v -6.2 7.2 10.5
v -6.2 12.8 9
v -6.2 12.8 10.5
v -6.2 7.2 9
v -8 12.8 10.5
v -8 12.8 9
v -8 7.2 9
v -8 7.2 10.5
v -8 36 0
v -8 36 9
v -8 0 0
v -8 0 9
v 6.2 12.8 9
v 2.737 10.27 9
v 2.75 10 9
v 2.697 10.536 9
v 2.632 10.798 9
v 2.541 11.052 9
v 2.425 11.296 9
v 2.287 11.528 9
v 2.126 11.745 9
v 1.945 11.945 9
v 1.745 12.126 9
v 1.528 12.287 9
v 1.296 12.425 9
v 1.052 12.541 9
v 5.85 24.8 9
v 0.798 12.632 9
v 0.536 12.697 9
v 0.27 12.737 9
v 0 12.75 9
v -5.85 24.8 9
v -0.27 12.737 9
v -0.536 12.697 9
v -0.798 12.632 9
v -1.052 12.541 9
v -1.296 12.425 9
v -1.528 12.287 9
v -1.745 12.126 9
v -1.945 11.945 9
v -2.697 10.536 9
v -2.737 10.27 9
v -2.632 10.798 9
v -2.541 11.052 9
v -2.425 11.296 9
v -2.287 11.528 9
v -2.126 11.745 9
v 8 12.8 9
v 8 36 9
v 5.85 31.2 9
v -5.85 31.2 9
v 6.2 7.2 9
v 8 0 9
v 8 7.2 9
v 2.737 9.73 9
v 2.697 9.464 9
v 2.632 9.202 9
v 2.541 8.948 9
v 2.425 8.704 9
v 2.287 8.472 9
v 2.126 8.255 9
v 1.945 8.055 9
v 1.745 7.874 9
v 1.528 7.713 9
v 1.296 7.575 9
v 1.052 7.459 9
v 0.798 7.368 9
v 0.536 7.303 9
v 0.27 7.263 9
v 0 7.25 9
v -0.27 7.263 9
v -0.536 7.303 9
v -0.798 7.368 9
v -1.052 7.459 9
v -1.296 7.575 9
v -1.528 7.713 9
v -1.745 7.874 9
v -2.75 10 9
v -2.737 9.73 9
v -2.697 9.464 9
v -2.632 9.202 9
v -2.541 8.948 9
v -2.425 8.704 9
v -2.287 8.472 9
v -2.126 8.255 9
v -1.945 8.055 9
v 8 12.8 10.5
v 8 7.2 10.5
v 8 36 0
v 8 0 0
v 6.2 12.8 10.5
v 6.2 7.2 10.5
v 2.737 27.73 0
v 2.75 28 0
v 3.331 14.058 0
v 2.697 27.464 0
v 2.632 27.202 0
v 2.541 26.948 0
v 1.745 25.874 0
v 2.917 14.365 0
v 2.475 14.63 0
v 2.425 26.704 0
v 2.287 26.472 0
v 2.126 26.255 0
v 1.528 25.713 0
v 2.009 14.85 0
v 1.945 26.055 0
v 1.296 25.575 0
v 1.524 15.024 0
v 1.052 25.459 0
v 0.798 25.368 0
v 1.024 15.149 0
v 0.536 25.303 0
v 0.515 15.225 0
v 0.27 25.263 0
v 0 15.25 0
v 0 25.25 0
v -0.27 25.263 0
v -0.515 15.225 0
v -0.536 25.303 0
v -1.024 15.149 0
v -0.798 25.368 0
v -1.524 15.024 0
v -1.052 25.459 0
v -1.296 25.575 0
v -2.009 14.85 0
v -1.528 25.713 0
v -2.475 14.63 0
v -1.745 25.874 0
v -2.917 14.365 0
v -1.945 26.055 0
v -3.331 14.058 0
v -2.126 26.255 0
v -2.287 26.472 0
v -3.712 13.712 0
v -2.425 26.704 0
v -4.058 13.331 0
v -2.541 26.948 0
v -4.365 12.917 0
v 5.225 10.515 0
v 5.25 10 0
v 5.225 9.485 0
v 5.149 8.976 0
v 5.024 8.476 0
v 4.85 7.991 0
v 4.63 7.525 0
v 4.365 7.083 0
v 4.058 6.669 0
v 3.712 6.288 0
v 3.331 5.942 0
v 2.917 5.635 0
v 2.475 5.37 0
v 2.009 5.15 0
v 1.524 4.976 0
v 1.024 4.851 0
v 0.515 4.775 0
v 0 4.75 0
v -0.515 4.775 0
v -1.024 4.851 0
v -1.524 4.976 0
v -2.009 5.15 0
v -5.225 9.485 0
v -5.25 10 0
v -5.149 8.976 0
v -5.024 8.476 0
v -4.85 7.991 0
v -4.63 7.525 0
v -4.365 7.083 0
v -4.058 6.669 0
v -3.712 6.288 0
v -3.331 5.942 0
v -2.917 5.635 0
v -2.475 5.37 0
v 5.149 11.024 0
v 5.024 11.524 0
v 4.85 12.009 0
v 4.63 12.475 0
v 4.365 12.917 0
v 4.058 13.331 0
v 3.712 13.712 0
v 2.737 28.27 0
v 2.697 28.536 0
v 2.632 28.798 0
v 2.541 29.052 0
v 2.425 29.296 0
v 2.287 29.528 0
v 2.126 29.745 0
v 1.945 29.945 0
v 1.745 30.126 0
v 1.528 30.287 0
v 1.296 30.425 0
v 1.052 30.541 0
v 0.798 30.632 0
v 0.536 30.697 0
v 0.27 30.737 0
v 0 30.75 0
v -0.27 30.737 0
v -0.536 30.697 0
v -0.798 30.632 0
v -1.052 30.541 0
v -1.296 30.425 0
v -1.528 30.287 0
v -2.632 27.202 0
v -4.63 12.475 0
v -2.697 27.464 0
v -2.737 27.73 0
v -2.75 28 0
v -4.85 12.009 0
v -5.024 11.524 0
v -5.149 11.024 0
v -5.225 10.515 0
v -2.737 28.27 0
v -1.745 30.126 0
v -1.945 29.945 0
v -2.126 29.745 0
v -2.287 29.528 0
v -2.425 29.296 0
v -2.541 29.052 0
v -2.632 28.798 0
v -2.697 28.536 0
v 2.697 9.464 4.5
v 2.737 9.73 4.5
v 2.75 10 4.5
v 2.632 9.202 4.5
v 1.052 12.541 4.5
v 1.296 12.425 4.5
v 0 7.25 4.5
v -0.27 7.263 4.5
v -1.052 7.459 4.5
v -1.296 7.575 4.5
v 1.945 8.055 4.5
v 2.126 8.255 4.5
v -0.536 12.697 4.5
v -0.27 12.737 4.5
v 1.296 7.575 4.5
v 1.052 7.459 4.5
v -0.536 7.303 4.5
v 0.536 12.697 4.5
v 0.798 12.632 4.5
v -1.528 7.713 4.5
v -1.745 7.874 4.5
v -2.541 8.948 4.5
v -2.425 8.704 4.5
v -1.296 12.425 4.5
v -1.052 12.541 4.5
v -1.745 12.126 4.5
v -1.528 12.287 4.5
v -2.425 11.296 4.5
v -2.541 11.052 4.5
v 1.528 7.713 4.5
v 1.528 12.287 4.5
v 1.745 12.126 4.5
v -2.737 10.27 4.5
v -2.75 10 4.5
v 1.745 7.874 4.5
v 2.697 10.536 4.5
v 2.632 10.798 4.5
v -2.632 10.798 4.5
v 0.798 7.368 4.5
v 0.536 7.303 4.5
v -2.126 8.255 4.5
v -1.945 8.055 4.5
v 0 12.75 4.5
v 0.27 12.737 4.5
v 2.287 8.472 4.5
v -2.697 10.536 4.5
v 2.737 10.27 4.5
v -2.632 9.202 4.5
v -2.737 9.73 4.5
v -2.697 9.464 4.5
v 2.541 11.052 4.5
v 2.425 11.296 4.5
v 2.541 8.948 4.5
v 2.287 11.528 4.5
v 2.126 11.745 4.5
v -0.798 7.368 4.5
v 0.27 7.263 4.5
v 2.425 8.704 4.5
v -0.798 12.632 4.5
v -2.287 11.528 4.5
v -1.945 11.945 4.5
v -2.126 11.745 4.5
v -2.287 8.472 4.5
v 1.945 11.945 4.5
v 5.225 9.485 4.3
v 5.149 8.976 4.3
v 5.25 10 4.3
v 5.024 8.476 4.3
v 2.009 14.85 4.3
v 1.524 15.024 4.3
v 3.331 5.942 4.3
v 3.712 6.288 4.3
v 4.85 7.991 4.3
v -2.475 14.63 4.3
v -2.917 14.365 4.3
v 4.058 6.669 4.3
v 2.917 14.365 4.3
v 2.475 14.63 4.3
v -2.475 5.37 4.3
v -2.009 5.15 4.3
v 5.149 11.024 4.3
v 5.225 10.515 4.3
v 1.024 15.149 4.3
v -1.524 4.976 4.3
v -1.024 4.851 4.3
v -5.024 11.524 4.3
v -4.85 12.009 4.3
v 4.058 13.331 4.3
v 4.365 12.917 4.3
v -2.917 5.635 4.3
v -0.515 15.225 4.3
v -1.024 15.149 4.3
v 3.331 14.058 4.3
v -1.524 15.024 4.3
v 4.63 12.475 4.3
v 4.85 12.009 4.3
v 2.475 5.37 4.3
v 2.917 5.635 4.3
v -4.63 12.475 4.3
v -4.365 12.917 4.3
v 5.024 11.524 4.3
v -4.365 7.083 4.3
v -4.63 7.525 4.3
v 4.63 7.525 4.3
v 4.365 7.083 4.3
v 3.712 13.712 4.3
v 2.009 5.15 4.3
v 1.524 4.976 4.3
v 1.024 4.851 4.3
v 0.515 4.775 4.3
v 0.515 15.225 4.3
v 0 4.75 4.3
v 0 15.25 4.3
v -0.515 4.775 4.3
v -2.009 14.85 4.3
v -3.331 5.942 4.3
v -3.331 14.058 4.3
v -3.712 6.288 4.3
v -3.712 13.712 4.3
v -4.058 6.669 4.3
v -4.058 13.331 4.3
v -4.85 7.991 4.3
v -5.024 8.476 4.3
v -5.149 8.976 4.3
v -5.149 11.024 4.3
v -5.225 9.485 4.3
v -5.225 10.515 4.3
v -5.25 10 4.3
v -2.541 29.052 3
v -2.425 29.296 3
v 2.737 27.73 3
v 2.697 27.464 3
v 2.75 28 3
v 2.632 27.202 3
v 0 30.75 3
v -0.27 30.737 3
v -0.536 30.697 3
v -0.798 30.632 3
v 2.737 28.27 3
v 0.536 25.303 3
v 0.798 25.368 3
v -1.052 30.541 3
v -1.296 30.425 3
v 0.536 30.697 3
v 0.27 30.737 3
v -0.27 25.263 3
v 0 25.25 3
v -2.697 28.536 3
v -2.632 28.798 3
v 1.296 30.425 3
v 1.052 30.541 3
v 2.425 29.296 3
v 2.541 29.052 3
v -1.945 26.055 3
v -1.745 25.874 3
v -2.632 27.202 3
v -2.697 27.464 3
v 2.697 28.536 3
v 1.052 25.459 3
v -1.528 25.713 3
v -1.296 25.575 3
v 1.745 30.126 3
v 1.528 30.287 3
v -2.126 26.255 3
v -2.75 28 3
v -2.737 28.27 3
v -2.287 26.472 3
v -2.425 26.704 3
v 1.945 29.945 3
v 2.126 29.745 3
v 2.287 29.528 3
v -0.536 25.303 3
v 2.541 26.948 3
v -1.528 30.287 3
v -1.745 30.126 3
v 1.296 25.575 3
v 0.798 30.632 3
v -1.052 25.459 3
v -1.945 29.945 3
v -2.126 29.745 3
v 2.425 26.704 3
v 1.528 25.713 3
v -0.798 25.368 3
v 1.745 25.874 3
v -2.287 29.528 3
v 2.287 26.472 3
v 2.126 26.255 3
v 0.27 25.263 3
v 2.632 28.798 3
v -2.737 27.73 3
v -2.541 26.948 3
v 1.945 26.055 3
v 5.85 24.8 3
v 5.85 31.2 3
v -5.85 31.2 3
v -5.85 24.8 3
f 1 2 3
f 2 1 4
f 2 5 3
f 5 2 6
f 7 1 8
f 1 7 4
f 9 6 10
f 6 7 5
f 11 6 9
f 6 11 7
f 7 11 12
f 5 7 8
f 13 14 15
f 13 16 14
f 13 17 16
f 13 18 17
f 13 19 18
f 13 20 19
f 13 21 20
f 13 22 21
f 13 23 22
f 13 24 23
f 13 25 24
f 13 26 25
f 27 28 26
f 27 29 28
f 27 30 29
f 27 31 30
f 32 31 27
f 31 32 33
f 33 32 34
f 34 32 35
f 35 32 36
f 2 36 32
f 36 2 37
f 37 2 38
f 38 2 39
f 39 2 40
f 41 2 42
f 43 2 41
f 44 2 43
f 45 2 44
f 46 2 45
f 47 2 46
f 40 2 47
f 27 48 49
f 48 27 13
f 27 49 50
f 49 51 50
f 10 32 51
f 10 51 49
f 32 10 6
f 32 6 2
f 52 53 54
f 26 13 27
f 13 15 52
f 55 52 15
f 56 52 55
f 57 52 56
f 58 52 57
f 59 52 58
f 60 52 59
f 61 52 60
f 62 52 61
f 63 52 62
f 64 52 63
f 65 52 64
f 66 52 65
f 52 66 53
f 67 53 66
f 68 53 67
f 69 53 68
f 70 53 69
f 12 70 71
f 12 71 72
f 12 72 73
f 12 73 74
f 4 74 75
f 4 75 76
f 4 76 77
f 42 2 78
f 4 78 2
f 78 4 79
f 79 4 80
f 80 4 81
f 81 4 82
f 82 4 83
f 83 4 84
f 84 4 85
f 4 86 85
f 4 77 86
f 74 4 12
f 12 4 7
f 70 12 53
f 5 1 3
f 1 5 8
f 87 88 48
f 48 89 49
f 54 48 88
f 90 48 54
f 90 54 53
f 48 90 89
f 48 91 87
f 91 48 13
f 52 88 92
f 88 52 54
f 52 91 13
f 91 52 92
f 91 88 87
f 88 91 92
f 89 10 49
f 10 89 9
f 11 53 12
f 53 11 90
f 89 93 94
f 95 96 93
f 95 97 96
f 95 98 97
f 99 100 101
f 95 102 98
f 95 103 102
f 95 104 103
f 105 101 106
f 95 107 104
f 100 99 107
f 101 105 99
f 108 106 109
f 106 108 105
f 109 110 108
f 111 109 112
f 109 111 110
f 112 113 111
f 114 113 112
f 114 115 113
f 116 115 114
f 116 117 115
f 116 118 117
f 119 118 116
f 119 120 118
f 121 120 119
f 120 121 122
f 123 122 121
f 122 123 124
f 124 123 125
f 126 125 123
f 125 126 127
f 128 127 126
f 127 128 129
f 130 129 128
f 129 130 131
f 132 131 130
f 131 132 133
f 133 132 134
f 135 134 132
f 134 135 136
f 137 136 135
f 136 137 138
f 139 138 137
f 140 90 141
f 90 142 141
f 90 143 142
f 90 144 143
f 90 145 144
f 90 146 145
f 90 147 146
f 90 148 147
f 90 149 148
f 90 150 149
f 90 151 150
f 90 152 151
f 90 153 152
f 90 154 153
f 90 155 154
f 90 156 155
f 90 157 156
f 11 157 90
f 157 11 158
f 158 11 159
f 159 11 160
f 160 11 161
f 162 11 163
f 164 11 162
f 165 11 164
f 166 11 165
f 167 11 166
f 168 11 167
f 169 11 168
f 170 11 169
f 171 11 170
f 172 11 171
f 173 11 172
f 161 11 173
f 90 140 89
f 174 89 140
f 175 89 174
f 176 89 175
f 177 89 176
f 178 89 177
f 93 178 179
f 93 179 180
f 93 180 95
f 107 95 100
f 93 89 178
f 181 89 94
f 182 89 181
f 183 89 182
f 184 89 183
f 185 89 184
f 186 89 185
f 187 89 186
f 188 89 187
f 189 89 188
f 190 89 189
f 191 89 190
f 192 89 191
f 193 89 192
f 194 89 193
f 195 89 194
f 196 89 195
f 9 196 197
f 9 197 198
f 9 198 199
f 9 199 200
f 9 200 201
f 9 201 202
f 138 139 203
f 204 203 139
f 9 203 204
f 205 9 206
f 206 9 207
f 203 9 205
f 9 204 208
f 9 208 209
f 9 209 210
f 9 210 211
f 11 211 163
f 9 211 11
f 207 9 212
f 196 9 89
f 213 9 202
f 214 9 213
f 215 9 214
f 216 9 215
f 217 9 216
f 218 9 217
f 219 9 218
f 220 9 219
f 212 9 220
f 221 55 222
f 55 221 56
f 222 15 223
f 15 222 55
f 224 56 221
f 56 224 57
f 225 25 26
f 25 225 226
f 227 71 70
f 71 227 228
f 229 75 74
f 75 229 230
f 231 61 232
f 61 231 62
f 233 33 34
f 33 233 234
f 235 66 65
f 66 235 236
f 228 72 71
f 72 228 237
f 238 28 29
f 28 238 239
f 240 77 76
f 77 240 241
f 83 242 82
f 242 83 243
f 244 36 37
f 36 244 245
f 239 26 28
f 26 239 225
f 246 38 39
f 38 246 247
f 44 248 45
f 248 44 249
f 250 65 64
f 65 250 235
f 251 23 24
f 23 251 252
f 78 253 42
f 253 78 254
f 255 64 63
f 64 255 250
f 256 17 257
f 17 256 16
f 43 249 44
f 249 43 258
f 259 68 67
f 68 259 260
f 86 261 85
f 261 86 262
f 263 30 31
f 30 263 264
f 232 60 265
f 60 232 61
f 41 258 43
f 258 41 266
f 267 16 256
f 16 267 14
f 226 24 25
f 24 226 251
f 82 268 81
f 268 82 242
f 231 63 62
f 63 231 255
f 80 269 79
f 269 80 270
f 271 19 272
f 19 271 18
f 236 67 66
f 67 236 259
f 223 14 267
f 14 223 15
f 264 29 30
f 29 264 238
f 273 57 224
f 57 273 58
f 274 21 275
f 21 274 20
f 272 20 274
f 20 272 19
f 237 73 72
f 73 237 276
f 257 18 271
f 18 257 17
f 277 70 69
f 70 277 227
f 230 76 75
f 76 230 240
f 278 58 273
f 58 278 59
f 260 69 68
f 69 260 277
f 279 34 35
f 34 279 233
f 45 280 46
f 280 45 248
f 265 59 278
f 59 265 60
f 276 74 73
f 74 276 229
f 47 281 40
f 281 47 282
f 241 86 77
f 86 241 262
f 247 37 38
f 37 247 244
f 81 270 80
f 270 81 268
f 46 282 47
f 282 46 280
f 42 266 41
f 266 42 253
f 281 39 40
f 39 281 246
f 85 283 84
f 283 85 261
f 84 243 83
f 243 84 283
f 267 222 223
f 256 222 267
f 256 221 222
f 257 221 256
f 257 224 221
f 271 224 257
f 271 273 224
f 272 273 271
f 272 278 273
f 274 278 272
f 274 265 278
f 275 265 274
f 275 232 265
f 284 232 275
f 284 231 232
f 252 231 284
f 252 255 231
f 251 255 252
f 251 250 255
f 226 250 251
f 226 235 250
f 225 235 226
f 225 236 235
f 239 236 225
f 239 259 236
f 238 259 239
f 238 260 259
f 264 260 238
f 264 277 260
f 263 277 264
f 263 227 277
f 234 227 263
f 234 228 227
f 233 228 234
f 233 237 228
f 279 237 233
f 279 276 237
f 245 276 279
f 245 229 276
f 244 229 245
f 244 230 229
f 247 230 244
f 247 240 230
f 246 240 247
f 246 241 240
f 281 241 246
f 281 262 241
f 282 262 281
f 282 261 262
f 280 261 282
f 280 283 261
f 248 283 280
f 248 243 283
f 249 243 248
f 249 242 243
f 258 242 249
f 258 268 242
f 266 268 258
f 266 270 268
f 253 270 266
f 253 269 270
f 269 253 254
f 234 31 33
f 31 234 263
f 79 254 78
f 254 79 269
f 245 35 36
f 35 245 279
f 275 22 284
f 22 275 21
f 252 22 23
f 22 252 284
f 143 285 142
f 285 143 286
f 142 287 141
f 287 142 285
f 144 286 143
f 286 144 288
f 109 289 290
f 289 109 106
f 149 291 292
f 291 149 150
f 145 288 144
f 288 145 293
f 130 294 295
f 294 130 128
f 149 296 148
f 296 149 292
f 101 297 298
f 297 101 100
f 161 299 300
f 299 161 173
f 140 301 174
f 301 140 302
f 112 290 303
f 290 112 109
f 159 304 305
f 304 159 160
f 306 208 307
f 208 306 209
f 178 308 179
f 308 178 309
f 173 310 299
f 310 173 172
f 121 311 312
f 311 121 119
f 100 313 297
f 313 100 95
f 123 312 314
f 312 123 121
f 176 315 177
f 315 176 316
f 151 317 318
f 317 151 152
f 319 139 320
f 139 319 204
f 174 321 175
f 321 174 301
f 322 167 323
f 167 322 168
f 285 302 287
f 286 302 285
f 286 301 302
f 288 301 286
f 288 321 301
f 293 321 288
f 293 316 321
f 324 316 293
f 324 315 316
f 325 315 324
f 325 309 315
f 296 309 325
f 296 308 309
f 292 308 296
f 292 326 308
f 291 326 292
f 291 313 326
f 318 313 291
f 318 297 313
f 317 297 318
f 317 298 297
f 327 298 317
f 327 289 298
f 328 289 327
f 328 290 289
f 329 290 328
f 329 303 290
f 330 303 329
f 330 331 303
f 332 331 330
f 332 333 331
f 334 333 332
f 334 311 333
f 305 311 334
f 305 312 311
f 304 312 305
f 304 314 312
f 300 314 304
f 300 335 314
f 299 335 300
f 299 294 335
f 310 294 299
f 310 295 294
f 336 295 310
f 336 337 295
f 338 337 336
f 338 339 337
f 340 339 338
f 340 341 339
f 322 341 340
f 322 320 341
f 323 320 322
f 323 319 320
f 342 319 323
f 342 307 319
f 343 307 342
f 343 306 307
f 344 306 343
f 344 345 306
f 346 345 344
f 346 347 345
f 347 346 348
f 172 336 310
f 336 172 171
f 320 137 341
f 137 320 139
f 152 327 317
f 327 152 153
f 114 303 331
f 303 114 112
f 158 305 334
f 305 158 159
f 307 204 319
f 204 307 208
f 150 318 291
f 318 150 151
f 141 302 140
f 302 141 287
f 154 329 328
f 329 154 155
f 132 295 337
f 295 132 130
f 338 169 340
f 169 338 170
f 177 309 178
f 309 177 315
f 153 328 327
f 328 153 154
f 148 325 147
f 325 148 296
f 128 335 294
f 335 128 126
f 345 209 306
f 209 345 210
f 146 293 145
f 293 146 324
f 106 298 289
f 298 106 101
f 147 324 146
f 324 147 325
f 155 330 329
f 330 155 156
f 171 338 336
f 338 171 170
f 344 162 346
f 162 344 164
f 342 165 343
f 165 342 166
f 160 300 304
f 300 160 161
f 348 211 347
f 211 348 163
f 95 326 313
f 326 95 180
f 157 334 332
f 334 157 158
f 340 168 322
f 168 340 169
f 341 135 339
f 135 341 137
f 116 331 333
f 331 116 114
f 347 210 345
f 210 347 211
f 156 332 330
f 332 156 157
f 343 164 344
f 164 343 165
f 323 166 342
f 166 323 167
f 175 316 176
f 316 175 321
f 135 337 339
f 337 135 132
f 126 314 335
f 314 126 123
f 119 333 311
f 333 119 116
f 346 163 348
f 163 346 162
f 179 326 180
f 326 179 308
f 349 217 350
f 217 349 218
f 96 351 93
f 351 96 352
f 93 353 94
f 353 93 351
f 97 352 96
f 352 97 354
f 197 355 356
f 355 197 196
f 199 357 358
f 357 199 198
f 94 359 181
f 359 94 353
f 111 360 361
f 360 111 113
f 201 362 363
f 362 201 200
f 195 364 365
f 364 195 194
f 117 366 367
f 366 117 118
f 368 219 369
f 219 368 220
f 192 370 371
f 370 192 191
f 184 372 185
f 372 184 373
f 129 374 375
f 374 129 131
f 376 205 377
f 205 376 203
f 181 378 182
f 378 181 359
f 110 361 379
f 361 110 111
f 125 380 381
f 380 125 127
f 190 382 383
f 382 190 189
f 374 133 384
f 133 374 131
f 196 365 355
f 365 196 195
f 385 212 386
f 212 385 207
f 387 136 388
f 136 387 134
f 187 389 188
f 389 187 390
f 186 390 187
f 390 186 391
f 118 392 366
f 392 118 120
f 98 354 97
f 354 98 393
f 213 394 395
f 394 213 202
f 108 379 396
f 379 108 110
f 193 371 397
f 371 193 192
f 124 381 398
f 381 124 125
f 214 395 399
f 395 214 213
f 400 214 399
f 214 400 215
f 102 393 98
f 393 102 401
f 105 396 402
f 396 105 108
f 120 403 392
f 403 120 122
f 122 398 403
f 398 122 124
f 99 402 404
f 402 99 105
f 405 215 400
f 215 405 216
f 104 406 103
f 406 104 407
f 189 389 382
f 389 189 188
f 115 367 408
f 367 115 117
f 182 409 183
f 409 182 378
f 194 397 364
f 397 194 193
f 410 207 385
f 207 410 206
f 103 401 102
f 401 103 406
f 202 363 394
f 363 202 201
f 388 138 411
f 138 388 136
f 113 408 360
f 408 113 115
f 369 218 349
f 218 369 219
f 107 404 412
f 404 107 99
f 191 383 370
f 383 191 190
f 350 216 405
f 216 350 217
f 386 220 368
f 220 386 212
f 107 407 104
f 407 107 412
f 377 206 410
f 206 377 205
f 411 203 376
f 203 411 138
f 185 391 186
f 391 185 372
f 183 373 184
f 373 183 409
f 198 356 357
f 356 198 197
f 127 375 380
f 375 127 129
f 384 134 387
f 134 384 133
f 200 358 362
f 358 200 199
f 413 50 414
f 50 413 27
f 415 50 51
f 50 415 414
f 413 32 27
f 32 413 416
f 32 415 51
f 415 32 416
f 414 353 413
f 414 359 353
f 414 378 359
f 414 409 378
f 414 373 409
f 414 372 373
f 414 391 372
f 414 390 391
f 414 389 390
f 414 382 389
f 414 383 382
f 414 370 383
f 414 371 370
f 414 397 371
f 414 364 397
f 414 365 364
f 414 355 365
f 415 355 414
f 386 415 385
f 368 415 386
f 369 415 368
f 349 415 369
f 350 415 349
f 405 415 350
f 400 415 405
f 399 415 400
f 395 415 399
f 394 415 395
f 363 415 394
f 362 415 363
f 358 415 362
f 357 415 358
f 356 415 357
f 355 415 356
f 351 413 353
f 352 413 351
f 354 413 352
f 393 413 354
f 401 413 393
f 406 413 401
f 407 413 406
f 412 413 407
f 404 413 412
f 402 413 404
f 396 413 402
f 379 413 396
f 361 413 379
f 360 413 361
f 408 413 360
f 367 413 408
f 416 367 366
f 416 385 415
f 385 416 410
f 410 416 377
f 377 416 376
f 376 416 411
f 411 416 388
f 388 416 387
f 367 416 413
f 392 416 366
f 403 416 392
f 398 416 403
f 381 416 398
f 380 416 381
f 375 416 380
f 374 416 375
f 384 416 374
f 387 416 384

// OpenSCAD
// Servo module carriage: bolts to a rail face, keyed in the slot. Print 4.
// Print orientation: front face (the one the bracket slides on) on the bed. Nut pocket and slot key face up: no overhang.
include <params.scad>
include <lib.scad>

translate([0, -rail_z0, car_y1]) rotate([-90, 0, 0]) servo_carriage();
